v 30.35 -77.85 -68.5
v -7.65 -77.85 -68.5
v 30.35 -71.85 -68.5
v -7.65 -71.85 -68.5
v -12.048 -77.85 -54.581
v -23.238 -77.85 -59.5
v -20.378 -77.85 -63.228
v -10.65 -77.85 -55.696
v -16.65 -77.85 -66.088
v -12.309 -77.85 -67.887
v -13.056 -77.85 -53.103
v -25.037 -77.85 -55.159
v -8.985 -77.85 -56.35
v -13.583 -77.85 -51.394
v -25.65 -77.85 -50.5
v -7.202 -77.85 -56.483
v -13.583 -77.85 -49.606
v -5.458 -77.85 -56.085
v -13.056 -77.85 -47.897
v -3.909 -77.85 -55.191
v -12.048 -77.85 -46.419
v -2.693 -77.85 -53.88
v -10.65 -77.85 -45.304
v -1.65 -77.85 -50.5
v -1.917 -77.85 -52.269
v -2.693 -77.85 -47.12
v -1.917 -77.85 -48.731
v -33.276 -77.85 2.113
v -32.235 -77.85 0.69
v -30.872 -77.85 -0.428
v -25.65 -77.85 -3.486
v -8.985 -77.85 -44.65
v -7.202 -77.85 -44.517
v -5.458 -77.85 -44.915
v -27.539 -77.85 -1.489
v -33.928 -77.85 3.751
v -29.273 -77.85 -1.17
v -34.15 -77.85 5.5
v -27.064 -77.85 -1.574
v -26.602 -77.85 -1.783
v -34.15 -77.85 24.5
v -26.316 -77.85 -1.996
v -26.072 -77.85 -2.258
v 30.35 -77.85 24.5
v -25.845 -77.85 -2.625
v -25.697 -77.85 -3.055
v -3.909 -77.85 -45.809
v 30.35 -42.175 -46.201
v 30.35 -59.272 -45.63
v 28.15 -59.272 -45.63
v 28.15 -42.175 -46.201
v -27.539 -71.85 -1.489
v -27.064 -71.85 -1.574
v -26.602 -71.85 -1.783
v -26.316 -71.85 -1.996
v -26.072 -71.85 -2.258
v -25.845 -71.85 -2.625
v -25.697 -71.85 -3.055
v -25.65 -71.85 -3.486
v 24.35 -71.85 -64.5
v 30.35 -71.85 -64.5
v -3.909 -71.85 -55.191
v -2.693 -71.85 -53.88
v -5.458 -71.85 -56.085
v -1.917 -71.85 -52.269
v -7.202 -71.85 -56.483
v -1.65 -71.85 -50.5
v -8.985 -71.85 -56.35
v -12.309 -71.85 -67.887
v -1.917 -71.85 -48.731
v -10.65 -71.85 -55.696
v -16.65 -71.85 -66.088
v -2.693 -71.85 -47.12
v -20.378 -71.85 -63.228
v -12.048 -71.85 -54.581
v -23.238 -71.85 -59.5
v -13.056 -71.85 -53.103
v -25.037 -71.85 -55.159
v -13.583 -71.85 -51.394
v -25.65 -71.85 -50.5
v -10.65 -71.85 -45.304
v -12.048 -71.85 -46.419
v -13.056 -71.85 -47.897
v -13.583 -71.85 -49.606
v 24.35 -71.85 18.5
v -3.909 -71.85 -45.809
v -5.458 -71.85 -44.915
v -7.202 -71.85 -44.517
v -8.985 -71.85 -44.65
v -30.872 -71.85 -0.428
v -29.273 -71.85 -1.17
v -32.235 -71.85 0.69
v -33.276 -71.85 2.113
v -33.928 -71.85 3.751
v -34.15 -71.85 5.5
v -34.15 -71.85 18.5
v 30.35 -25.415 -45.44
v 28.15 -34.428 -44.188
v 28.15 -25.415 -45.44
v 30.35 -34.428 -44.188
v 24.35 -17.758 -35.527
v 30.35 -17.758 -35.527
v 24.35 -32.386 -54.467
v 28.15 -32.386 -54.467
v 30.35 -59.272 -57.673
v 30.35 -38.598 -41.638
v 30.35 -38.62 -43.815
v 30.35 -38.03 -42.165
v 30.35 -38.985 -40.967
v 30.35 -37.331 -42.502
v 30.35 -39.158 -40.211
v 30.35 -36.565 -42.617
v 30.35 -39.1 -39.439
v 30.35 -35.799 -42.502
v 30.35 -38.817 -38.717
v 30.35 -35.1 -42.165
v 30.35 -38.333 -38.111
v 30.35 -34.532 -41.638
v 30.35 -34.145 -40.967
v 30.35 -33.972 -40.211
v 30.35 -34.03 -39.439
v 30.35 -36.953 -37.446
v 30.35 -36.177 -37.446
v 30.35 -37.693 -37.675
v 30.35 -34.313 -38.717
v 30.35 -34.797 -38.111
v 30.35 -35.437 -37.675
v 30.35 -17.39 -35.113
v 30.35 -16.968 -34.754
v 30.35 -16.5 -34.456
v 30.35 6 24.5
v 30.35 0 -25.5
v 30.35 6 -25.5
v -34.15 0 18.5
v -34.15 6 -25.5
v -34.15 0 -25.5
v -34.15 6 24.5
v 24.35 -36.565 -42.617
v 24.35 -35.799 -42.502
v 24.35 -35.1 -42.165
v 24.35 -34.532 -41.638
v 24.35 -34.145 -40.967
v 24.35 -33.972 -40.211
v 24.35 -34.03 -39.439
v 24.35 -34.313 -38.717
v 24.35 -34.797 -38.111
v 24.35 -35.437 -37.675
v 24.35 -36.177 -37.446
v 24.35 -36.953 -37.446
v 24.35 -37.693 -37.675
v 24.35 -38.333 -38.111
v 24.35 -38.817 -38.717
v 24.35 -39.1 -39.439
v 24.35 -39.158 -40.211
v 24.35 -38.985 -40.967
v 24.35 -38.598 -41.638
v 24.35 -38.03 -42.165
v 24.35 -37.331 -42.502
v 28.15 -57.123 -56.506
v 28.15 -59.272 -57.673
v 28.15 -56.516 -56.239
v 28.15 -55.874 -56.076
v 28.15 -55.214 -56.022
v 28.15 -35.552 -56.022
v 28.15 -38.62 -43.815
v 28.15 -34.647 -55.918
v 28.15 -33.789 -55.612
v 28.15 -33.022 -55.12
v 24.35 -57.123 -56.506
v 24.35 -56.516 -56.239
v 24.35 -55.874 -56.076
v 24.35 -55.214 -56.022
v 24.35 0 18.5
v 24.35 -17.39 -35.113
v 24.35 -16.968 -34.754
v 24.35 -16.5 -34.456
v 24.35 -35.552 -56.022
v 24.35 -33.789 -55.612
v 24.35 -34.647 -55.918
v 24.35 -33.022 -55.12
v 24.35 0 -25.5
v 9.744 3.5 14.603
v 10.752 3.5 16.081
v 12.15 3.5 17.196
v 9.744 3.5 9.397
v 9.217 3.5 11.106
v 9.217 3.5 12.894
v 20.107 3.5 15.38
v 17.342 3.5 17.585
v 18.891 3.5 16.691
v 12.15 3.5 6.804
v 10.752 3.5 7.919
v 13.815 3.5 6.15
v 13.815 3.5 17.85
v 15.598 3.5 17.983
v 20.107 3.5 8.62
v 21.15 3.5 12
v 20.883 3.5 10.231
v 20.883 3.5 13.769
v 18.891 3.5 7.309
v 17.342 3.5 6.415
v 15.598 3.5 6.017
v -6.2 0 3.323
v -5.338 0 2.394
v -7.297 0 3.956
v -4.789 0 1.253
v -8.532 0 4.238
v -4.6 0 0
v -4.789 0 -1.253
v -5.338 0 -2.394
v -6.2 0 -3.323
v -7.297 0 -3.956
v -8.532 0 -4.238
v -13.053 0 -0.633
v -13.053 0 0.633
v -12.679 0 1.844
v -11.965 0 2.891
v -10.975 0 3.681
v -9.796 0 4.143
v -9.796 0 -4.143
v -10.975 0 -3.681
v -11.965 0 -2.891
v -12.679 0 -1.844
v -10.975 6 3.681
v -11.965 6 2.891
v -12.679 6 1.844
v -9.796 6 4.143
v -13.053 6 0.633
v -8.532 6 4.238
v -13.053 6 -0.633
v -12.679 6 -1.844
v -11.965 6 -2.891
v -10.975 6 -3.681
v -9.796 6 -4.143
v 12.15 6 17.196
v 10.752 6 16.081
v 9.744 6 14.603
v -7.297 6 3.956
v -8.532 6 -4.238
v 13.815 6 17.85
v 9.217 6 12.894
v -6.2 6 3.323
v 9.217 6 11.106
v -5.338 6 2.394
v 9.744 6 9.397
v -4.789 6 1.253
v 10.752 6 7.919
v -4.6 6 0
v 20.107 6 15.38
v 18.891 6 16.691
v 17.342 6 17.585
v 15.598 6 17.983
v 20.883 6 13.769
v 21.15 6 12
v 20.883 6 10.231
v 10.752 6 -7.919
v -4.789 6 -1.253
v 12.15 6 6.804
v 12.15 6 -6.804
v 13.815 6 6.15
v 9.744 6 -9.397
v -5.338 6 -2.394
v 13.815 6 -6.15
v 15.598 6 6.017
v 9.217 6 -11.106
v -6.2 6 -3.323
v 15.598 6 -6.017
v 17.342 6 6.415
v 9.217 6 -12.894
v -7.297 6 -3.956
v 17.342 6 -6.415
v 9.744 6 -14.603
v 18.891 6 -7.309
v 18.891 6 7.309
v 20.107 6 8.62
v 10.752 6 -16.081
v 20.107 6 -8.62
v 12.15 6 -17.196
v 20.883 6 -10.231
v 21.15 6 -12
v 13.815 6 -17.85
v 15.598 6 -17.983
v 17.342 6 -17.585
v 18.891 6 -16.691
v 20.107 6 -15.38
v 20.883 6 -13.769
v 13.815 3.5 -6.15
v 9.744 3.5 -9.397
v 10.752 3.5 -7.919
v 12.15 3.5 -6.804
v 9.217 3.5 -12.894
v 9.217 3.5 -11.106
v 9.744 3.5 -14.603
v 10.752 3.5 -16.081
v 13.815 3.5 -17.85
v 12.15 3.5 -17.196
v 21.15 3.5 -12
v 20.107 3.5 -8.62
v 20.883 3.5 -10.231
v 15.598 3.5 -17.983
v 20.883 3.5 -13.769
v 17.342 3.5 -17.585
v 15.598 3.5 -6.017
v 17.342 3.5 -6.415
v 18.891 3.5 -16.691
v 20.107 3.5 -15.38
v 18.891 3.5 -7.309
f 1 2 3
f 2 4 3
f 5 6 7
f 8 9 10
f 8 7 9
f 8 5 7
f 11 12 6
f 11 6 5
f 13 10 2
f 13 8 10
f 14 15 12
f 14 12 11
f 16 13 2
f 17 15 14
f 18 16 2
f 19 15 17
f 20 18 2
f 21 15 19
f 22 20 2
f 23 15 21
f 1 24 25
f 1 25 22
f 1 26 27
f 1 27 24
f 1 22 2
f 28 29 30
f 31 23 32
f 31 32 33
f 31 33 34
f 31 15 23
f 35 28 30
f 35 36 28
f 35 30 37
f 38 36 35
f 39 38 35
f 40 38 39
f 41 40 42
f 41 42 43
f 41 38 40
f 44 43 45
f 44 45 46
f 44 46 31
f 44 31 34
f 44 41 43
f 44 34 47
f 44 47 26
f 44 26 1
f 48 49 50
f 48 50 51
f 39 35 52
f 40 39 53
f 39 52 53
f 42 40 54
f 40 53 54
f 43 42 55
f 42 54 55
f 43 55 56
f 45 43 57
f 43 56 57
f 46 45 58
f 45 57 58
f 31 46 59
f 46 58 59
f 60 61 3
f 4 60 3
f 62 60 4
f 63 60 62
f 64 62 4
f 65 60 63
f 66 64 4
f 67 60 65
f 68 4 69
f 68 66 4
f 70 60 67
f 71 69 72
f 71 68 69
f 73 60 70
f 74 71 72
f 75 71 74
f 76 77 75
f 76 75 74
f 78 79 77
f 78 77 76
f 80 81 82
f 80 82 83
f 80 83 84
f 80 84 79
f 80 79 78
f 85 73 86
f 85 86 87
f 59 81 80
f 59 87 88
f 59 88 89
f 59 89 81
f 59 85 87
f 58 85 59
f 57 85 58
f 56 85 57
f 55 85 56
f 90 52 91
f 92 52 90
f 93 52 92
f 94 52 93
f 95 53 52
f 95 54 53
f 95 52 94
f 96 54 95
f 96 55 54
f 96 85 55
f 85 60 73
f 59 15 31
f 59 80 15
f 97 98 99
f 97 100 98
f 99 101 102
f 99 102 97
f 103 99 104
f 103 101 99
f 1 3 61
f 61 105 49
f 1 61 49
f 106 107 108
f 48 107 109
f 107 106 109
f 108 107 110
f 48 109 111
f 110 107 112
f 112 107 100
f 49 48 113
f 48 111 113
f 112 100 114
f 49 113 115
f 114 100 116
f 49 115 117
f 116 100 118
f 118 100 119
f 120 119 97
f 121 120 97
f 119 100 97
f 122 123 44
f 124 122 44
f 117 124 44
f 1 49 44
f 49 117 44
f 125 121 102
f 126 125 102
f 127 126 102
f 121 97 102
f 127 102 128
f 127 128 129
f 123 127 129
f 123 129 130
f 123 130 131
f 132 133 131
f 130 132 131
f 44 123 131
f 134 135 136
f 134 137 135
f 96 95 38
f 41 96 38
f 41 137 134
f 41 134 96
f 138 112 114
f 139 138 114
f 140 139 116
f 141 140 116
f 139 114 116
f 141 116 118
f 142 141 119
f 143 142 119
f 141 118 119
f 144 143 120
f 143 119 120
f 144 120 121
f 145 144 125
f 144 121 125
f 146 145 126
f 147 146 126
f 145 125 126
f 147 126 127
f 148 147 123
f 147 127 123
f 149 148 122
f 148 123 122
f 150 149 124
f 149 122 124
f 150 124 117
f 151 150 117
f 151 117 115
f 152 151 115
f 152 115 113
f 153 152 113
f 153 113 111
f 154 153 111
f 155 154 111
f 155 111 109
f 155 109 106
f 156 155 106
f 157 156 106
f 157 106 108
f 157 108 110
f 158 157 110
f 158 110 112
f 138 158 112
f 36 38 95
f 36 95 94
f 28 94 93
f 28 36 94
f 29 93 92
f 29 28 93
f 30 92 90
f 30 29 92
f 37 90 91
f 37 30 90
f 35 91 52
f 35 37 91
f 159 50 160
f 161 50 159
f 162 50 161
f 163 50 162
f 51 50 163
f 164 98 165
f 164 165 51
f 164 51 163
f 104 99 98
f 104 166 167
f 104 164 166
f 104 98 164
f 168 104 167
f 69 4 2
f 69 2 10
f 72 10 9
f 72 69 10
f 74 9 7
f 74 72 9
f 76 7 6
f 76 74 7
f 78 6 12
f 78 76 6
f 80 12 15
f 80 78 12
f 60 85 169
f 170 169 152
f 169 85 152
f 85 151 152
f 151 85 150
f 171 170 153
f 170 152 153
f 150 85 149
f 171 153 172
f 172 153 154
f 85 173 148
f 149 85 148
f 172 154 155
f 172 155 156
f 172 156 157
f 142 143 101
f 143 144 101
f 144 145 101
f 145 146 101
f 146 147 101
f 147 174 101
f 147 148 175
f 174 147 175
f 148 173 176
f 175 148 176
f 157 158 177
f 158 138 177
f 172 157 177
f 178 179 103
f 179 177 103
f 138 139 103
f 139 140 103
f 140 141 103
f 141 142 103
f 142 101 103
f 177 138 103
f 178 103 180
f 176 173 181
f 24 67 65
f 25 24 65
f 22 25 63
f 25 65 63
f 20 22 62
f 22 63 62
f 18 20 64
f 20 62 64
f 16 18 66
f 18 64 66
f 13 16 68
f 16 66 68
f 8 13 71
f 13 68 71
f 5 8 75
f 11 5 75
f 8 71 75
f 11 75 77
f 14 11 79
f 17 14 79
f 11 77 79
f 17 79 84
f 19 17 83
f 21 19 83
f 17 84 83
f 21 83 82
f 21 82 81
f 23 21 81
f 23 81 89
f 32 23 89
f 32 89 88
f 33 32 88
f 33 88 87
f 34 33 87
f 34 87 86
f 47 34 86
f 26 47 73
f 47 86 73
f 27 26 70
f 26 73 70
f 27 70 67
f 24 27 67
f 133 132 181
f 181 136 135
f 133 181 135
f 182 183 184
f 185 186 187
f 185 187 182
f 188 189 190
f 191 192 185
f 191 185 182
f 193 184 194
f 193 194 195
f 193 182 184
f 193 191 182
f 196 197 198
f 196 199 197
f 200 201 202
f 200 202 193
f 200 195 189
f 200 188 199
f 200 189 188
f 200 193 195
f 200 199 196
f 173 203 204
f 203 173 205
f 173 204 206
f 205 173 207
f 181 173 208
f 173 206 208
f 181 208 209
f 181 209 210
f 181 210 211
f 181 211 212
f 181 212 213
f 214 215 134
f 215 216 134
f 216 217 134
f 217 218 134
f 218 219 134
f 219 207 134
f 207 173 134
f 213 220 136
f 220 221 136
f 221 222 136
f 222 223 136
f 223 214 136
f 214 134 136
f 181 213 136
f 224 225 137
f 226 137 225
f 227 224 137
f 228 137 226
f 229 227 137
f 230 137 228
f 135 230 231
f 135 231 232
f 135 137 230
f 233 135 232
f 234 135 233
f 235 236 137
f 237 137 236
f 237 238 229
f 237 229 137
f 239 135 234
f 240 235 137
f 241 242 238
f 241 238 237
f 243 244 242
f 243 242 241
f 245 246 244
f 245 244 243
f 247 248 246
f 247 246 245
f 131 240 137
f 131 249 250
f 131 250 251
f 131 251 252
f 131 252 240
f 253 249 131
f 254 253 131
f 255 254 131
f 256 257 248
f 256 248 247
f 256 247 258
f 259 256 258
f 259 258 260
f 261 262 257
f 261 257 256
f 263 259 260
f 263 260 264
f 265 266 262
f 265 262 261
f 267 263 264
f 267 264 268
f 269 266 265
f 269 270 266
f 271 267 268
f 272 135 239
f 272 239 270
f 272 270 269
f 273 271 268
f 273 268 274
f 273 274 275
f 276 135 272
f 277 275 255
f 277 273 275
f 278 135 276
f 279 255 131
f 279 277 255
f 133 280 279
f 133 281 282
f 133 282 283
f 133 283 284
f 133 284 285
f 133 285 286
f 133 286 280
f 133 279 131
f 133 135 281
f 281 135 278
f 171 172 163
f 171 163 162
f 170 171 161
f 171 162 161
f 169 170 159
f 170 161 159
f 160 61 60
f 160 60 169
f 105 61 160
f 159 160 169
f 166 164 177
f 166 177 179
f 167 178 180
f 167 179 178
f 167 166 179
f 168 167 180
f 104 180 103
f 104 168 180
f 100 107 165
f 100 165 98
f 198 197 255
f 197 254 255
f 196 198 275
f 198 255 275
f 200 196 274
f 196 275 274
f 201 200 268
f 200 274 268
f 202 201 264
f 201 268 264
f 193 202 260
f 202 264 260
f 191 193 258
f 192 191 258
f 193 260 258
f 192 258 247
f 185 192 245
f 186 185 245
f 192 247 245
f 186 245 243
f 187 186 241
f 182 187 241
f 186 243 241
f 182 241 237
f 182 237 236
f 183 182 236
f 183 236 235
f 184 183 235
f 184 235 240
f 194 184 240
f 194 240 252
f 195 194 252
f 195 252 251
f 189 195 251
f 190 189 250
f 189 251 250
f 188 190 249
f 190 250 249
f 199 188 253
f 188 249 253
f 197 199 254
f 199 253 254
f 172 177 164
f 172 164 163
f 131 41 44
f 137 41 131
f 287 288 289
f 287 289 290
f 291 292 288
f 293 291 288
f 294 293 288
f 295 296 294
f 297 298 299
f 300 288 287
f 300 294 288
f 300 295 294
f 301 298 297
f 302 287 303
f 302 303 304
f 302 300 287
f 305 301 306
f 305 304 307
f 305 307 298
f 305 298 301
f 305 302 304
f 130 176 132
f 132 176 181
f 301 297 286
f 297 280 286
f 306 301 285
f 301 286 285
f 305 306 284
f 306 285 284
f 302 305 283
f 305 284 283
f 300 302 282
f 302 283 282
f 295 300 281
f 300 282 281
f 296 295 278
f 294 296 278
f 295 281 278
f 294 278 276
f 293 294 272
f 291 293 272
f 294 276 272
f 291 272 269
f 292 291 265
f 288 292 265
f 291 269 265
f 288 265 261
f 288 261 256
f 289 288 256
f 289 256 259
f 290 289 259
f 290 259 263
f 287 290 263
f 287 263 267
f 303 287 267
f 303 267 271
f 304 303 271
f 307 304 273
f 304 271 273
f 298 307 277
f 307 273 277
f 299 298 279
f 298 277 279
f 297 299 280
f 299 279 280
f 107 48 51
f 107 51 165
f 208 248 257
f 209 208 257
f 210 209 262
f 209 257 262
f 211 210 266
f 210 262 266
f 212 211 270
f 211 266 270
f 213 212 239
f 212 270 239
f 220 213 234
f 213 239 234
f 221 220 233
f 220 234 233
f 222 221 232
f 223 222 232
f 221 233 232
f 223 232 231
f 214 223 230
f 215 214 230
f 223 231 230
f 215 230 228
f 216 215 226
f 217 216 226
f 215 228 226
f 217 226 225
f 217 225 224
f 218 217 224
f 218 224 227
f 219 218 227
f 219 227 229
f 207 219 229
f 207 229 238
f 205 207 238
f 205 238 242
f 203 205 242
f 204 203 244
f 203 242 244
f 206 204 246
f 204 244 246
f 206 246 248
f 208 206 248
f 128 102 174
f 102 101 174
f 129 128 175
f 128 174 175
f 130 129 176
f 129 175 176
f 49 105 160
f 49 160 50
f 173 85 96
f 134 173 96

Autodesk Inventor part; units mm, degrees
ref_plane "YZ Plane" through (0, 0, 0) normal (1, 0, 0) x (0, 1, 0)
ref_plane "XZ Plane" through (0, 0, 0) normal (0, 1, 0) x (-1, 0, 0)
ref_plane "XY Plane" through (0, 0, 0) normal (0, 0, 1) x (1, 0, 0)
sketch "Sketch1" plane through (0, 0, 0) normal (0, 1, 0) x (-1, 0, 0)
  line L0 (0, -25.5) -> (-34.15, -25.5)
  line L1 (-34.15, -25.5) -> (-34.15, 0)
  line L2 (-34.15, 0) -> (-34.15, 25.5)
  line L3 (-34.15, 25.5) -> (0, 25.5)
  line L4 (0, 25.5) -> (34.15, 25.5)
  line L5 (34.15, 25.5) -> (34.15, 0)
  line L6 (34.15, 0) -> (34.15, -25.5)
  line L7 (34.15, -25.5) -> (0, -25.5)
  point P0 (0, 0)
extrude "Extrusion1" add sketch "Sketch1" along normal blind 7
sketch "Sketch3" plane through (-34.15, 0, 25.5) normal (0, 0, 1) x (1, 0, 0)
  line L0 (0, 0) -> (0, -78.85)
  point P0 (34.15, 0)
  dimension "d7" = 78.85
sketch "Sketch4" plane through (-34.15, 0, -25.5) normal (-1, 0, 0) x (0, 0, 1)
  line L0 (51, 0) -> (51, -78.85)
  line L1 (51, -78.85) -> (-39, -78.85)
  line L2 (-39, -78.85) -> (-39, -71.85)
  line L3 (0, 0) -> (-39, -71.85)
  line L4 (0, 0) -> (51, 0)
  point P0 (25.5, 0)
  dimension "d10" = 90
  dimension "d11" = 7
extrude "Extrusion2" add sketch "Sketch4" against normal blind 7
sketch "Sketch7" plane through (-27.15, 0, -25.5) normal (1, 0, 0) x (0, 0, -1)
  line L0 (-51, -78.85) -> (39, -78.85) projected
  line L1 (-51, -78.85) -> (39, -78.85)
  line L2 (39, -78.85) -> (39, -71.85) projected
  line L3 (39, -78.85) -> (39, -71.85)
  line L4 (39, -71.85) -> (-51, -71.85)
  line L5 (-51, 0) -> (-51, -78.85) projected
  line L6 (-51, -78.85) -> (-51, -71.85)
  point P0 (-25.5, 0)
sketch "Sketch8" plane through (0, 0, 0) normal (0, -1, 0) x (1, 0, 0)
  circle A0 centre (8.15, 0) radius 5 projected
  line L0 (8.15, 18.5) -> (34.15, 18.5)
  line L1 (34.15, 25.5) -> (34.15, -25.5) projected
  line L2 (8.15, 25.5) -> (34.15, 25.5)
  line L3 (8.15, 25.5) -> (-27.15, 25.5)
  line L4 (-27.15, 25.5) -> (-27.15, -25.5) projected
  line L5 (8.15, 18.5) -> (-27.15, 18.5)
  line L6 (34.15, 25.5) -> (34.15, 18.5)
  line L7 (-27.15, 25.5) -> (-27.15, 18.5)
  point P0 (0, 0)
extrude "Extrusion6" add sketch "Sketch7" along normal blind 58.5
extrude "Extrusion7" add sketch "Sketch8" along normal blind 78.75 contours L5 L4 L3 L2 L1 L0
sketch "Sketch9" plane through (31.35, 0, -25.5) normal (1, 0, 0) x (0, 0, -1)
  line L0 (-51, -78.75) -> (-51, 7) projected
  line L1 (-44, 0) -> (-44, -71.85) projected
  line L2 (-51, -78.75) -> (-44, -78.75)
  line L3 (-44, -78.75) -> (-44, -71.85)
  line L4 (-44, -71.85) -> (-51, -71.85)
  line L5 (-51, -71.85) -> (-51, -78.75)
  point P0 (-25.5, 0)
extrude "Extrusion8" cut sketch "Sketch9" along normal blind 10
sketch "Sketch10" plane through (0, 7, 0) normal (0, 1, 0) x (1, 0, 0)
  point P0 (0, 0)
sketch "Boceto11" plane through (-34.15, -78.85, -64.5) normal (0, -1, 0) x (1, 0, 0)
  line L0 (0, 0) -> (65.5, 0) projected
  line L1 (65.5, 89.9985) -> (65.5, 0)
  line L2 (65.5, 0) -> (71.065, 0)
  line L3 (71.065, 0) -> (71.065, 89.9985)
  line L4 (71.065, 89.9985) -> (65.5, 89.9985)
  line L5 (65.5, 89.9985) -> (65.5, 95.8996)
  line L6 (65.5, 95.8996) -> (71.065, 89.9985)
  point P0 (34.15, 64.5)
extrude "Extrusión9" cut sketch "Boceto11" against normal blind 100
sketch "Boceto12" plane through (31.35, 0, -25.5) normal (1, 0, 0) x (0, 0, -1)
  line L0 (-44, 0) -> (-44, -71.85) projected
  line L1 (-44, 0) -> (-44, -71.85)
  line L2 (39, -71.85) -> (39, -78.85) projected
  line L3 (-44, -71.85) -> (39, -71.85)
  line L4 (-44, 0) -> (0, 0) projected
  line L5 (39, -71.85) -> (0, 0)
  line L6 (0, 0) -> (-44, 0)
  point P0 (-25.5, 0)
extrude "Extrusión10" add sketch "Boceto12" against normal blind 7
sketch "Boceto13" plane through (-34.15, 7, -25.5) normal (-1, 0, 0) x (0, 0, 1)
  line L0 (0, -7) -> (0, 0) projected
  line L1 (44, -7) -> (0, -7) projected
  line L2 (0, -7) -> (44, -7)
  line L3 (44, -78.85) -> (-39, -78.85) projected
  line L4 (44, -7) -> (44, -78.85)
  line L5 (44, -78.85) -> (-39, -78.85)
  line L6 (-39, -78.85) -> (0, -7)
  point P0 (25.5, -7)
extrude "Extrusión11" cut sketch "Boceto13" against normal blind 7
sketch "Boceto15" plane through (-34.15, 0, -25.5) normal (0, 0, -1) x (-1, 0, 0)
  point P0 (-34.15, 0)
sketch "Boceto19" plane through (-34.15, -78.85, -64.5) normal (0, -1, 0) x (1, 0, 0)
  line L0 (65.5, 90) -> (65.5, 0) projected
  line L1 (65.5, 0) -> (65.5, 40.9323)
  line L2 (81.7334, 40.9323) -> (65.5, 40.9323)
  line L3 (81.7334, 40.9323) -> (81.7334, 0)
  line L4 (81.7334, 0) -> (65.5, 0)
  point P0 (34.15, 64.5)
extrude "Extrusión17" cut sketch "Boceto19" against normal blind 100
sketch "Boceto20" plane through (24.35, 0, -25.5) normal (-1, 0, 0) x (0, 0, 1)
  line L0 (-29.1839, -53.7657) -> (-27.9516, -53.3206) projected
  line L1 (0, 0) -> (-39, -71.85) projected
  line L2 (-29.1839, -53.7657) -> (-27.8697, -51.3447)
  line L3 (-27.8697, -51.3447) -> (-27.9516, -53.3206) projected
  line L4 (-27.8697, -51.3447) -> (-27.9516, -53.3206)
  line L5 (-27.9516, -53.3206) -> (-29.1839, -53.7657)
  point P0 (25.5, 0)
extrude "Extrusión18" add sketch "Boceto20" against normal blind 7
sketch "Boceto21" plane through (24.35, 0, -25.5) normal (-1, 0, 0) x (0, 0, 1)
  point P0 (25.5, 0)
sketch "Boceto22" plane through (24.35, 0, -25.5) normal (-1, 0, 0) x (0, 0, 1)
  point P0 (25.5, 0)
sketch "Boceto24" plane through (31.35, 0, -25.5) normal (1, 0, 0) x (0, 0, -1)
  point P0 (-25.5, 0)
sketch "Boceto26" plane through (24.35, 0, -25.5) normal (-1, 0, 0) x (0, 0, 1)
  point P0 (25.5, 0)
sketch "Boceto27" plane through (31.35, 0, -25.5) normal (1, 0, 0) x (0, 0, -1)
  line L0 (-51, 7) -> (0, 7) projected
  line L1 (0, 7) -> (16.0227, 7)
  line L2 (16.0227, 7) -> (16.0227, -29.5187)
  line L3 (0, 0) -> (39, -71.85) projected
  line L4 (16.0227, -29.5187) -> (0, 0)
  line L5 (0, 0) -> (0, 7)
  point P0 (-25.5, 0)
extrude "Extrusión22" add sketch "Boceto27" against normal blind 7
sketch "Boceto28" plane through (24.35, 0, -25.5) normal (-1, 0, 0) x (0, 0, 1)
  line L0 (-16.0227, -29.5187) -> (-39, -71.85) projected
  line L1 (-16.0227, -29.5187) -> (0, 0)
  line L2 (0, 7) -> (-16.0227, 7) projected
  line L3 (0, 0) -> (0, 7)
  line L4 (0, 7) -> (-16.0227, 7)
  line L5 (-16.0227, 7) -> (-16.0227, -29.5187) projected
  line L6 (-16.0227, 7) -> (-16.0227, -29.5187)
  point P0 (25.5, 0)
extrude "Extrusión23" cut sketch "Boceto28" against normal blind 7
sketch "Boceto29" plane through (31.35, 0, -25.5) normal (1, 0, 0) x (0, 0, -1)
  point P0 (-25.5, 0)
sketch "Boceto31" plane through (-34.15, -78.85, -64.5) normal (0, 0, -1) x (-1, 0, 0)
  line L0 (0, 7) -> (0, 0) projected
  line L1 (0, 0) -> (0, 1)
  line L2 (0, 1) -> (-65.5, 1)
  line L3 (-65.5, 0) -> (-65.5, 85.85) projected
  line L4 (-65.5, 1) -> (-64.5, 1)
  line L5 (-64.5, 1) -> (-64.5, 85.85)
  line L6 (0, 85.85) -> (-65.5, 85.85) projected
  line L7 (-64.5, 85.85) -> (0, 85.85)
  line L8 (0, 85.85) -> (0, 84.85)
  line L9 (0, 0) -> (0, 85.85) projected
  line L10 (0, 84.85) -> (-64.5, 84.85)
  line L11 (-64.5, 85.85) -> (-65.5, 85.85)
  line L12 (0, 0) -> (-65.5, 0) projected
  line L13 (-65.5, 85.85) -> (-65.5, 0)
  line L14 (-65.5, 0) -> (0, 0)
  point P0 (-34.15, 78.85)
  dimension "d84" = 1
  dimension "d85" = 1
  dimension "d86" = 1
extrude "Extrusión26" cut sketch "Boceto31" against normal blind 1000 contours L0 L12 L3 L2 | L10 L5 L6 L8 | L2 L3 L6 L5
sketch "Boceto32" plane through (-34.15, -71.85, 18.5) normal (-1, 0, 0) x (0, 0, 1)
  line L0 (-83, -6) -> (7, -6) projected
  line L1 (7, -6) -> (6, -6)
  line L2 (6, -6) -> (6, 77.85)
  line L3 (7, 77.85) -> (-44, 77.85) projected
  line L4 (7, -6) -> (7, 77.85) projected
  line L5 (6, 77.85) -> (7, 77.85)
  line L6 (7, 77.85) -> (7, -6)
  point P0 (-18.5, 71.85)
  dimension "d89" = 1
extrude "Extrusión27" cut sketch "Boceto32" against normal blind 100
sketch "Boceto33" plane through (-34.15, 6, -25.5) normal (0, 1, 0) x (1, 0, 0)
  line L0 (0, 0) -> (0, -44) projected
  line L1 (0, 0) -> (0, -25.5)
  line L2 (0, -25.5) -> (25.3, -25.5)
  circle A0 centre (25.3, -25.5) radius 4.25
  point P0 (34.15, -25.5)
  dimension "d92" = 25.5
  dimension "d93" = 25.3
  dimension "d94" = 8.5
extrude "Extrusión28" cut sketch "Boceto33" against normal blind 10
sketch "Boceto34" plane through (30.35, -77.85, -64.5) normal (1, 0, 0) x (0, 0, -1)
  point P0 (-64.5, 77.85)
sketch "Boceto35" plane through (30.35, -77.85, -64.5) normal (1, 0, 0) x (0, 0, -1)
  circle A0 centre (-24.4828, 41.285) radius 2.6
  point P0 (-64.5, 77.85)
  dimension "d101" = 5.2
extrude "Extrusión29" cut sketch "Boceto35" against normal blind 10
sketch "Boceto36" plane through (30.35, -77.85, -64.5) normal (1, 0, 0) x (0, 0, -1)
  point P0 (-64.5, 77.85)
sketch "Boceto37" plane through (30.35, -77.85, -64.5) normal (1, 0, 0) x (0, 0, -1)
  line L0 (-39, 77.85) -> (0, 6) projected
  line L1 (-12.3437, 28.741) -> (-12.3437, 48.1268)
  line L2 (-12.3437, 48.1268) -> (-28.4038, 58.3285)
  line L3 (-12.3437, 28.741) -> (-28.4038, 58.3285)
  point P0 (-64.5, 77.85)
extrude "Extrusión30" add sketch "Boceto37" against normal blind 6
fillet "Empalme3" radius 10 3 edges at (27.35, -29.7232, -52.1563) (27.35, -49.109, -52.1563) (27.35, -19.5215, -36.0962)
sketch "Boceto38" plane through (30.35, -77.85, -64.5) normal (1, 0, 0) x (0, 0, -1)
  point P0 (-64.5, 77.85)
sketch "Boceto39" plane through (30.35, -77.85, -64.5) normal (1, 0, 0) x (0, 0, -1)
  line L0 (-6.8274, 18.5782) -> (-18.8698, 18.5782)
  line L1 (-18.8698, 18.5782) -> (-18.2969, 35.7502)
  line L2 (-18.2969, 35.7502) -> (-20.685, 39.2299)
  line L3 (-20.685, 39.2299) -> (-19.4909, 52.6668)
  line L4 (-26.2143, 56.9377) -> (-16.9818, 51.073) projected
  line L5 (-6.8274, 18.5782) -> (-5.5662, 48.0514)
  line L6 (-5.5662, 48.0514) -> (-19.4909, 52.6668)
  point P0 (-64.5, 77.85)
extrude "Extrusión31" cut sketch "Boceto39" against normal blind 2.2
fillet "Empalme4" radius 10 1 edges at (29.25, -25.1832, -45.0091)
sketch "Boceto40" plane through (24.35, 0, -25.5) normal (-1, 0, 0) x (0, 0, 1)
  line L0 (-26.6563, -35.218) -> (-26.6563, -46.57) projected
  line L1 (-26.6563, -35.218) -> (-24.0221, -30.4862) construction
  arc A0 (-12.7857, -20.9123) -> (-9.3588, -17.2419) centre (-18.1476, -12.4713) ccw projected
  line L2 (-24.0221, -30.4862) -> (-10.7107, -19.1566) construction
  spline S0 degree 2 poles (-26.6563, -35.218) (-24.0221, -30.4862) (-10.7107, -19.1566) knots 1 1 1 2 2 2
  line L3 (-26.6563, -35.218) -> (-10.7107, -35.218)
  line L4 (-10.7107, -35.218) -> (-10.7107, -19.1566)
  line L5 (-10.7107, -19.1566) -> (-26.6563, -19.1566)
  line L6 (-26.6563, -19.1566) -> (-26.6563, -35.218)
  point P0 (25.5, 0)
  point P1 (-10.7107, -19.1566)
extrude "Extrusión32" cut sketch "Boceto40" against normal blind 6 contours S0 L6 L5
fillet "Empalme5" radius 10 1 edges at (26.25, -35.218, -52.1563)
sketch "Boceto41" plane through (-34.15, -71.85, 18.5) normal (0, 1, 0) x (1, 0, 0)
  circle A0 centre (11.5, 71.5) radius 5 projected
  circle A1 centre (11.5, 71.5) radius 6
  line L0 (11.5, 71.5) -> (-12.5, 71.5)
  line L1 (-12.5, 71.5) -> (-12.5, 95.5)
  line L2 (-12.5, 95.5) -> (11.5, 95.5)
  line L3 (11.5, 95.5) -> (11.5, 71.5)
  line L4 (64.5, 76.1726) -> (64.5, 83) projected
  line L5 (64.5, 83) -> (64.5, 95.5)
  line L6 (64.5, 95.5) -> (11.5, 95.5)
  line L7 (0, 83) -> (0, -6) projected
  line L8 (0, -6) -> (-12.5, -6)
  line L9 (-12.5, -6) -> (-12.5, 71.5)
  line L10 (64.5, 83) -> (11.5, 83)
  line L11 (0, 83) -> (58.5, 83) projected
  point P0 (34.15, 18.5)
  dimension "d113" = 12
  dimension "d114" = 24
  dimension "d115" = 24
extrude "Extrusión33" add sketch "Boceto41" against normal blind 6 contours L11 L7 L0 L1 L2 L3 | L3 L6 L5 L10 | L7 L8 L9 L0
sketch "Boceto43" plane through (30.35, 6, 24.5) normal (0, 1, 0) x (1, 0, 0)
  circle A0 centre (-39.2, 24.5) radius 4.25 projected
  line L0 (-39.2, 24.5) -> (-15.2, 24.5)
  line L1 (-15.2, 24.5) -> (-15.2, 12.5)
  line L2 (-15.2, 12.5) -> (-15.2, 36.5)
  circle A1 centre (-15.2, 36.5) radius 6
  circle A2 centre (-15.2, 12.5) radius 6
  point P0 (-30.35, 24.5)
  dimension "d123" = 24
  dimension "d124" = 12
  dimension "d125" = 24
  dimension "d126" = 12
  dimension "d127" = 12
extrude "Extrusión35" cut sketch "Boceto43" against normal blind 2.5 contours A1 | A2
sketch "Boceto44" plane through (24.35, 0, -25.5) normal (-1, 0, 0) x (0, 0, 1)
  line L0 (0, 0) -> (-9.3588, -17.2419) projected
  line L1 (-9.3588, -17.2419) -> (-30.5215, -33.5874)
  line L2 (-30.5215, -33.5874) -> (-30.5215, -56.2301)
  line L3 (-27.8675, -51.3405) -> (-39, -71.85) projected
  arc A0 (-12.666, -20.8351) -> (-9.3588, -17.2419) centre (-18.1476, -12.4713) ccw projected
  line L4 (-30.5215, -56.2301) -> (-9.3588, -17.2419)
  point P0 (25.5, 0)
extrude "Extrusión36" add sketch "Boceto44" against normal blind 6
sketch "Boceto45" plane through (30.35, 0, -25.5) normal (1, 0, 0) x (0, 0, -1)
  line L0 (18.315, -38.6201) -> (18.6875, -34.4282) projected
  line L1 (18.6875, -34.4282) -> (19.9402, -25.4146)
  line L2 (9.3588, -17.2419) -> (30.5215, -33.5874) projected
  line L3 (30.5215, -56.2301) -> (30.5215, -33.5874) projected
  line L4 (19.9402, -25.4146) -> (30.5215, -33.5874)
  line L5 (30.5215, -33.5874) -> (32.1519, -59.2336)
  line L6 (30.5215, -56.2301) -> (39, -71.85) projected
  line L7 (32.1726, -59.2718) -> (20.1302, -59.2718) projected
  line L8 (32.1726, -59.2718) -> (18.315, -38.6201)
  point P0 (-25.5, 0)
extrude "Extrusión37" cut sketch "Boceto45" against normal blind 2.2 contours L0 L1 L2 L3 L6 L8
fillet "Empalme7" radius 4 3 edges at (26.25, -33.5874, -56.0215) (27.35, -17.2419, -34.8588) (26.25, -56.2301, -56.0215)
sketch "Boceto46" plane through (-34.15, -71.85, 18.5) normal (0, 1, 0) x (1, 0, 0)
  line L0 (-12.5, -6) -> (0, -6) projected
  line L1 (0, -6) -> (0, 95.5)
  line L2 (-12.5, 95.5) -> (64.5, 95.5) projected
  line L3 (0, 95.5) -> (-12.5, 95.5)
  line L4 (-12.5, 95.5) -> (-12.5, -6)
  line L5 (-12.5, -6) -> (0, -6)
  point P0 (34.15, 18.5)
extrude "Extrusión38" cut sketch "Boceto46" against normal blind 10
sketch "Boceto47" plane through (-34.15, -71.85, 18.5) normal (0, 1, 0) x (1, 0, 0)
  line L0 (0, 0) -> (0, -6) projected
  line L1 (0, 95.5) -> (26.5, 95.5)
  line L2 (26.5, 95.5) -> (26.5, 69)
  line L3 (26.5, 69) -> (0, 69)
  line L4 (0, 69) -> (0, 95.5)
  circle A0 centre (26.5, 69) radius 6
  point P0 (34.15, 18.5)
  dimension "d137" = 26.5
  dimension "d138" = 26.5
  dimension "d139" = 12
extrude "Extrusión39" cut sketch "Boceto47" against normal blind 10 contours A0 L3 L2 | L2 L3 A0
sketch "Sketch48" plane through (-34.15, -71.85, 18.5) normal (0, 1, 0) x (1, 0, 0)
  circle A0 centre (26.5, 69) radius 6 projected
  line L0 (29.7126, 74.0675) -> (26.5, 69)
  circle A1 centre (26.5, 69) radius 18
  line L1 (8.5, 69) -> (8.5, 0)
  line L2 (0, 0) -> (58.5, 0) projected
  line L3 (0, 0) -> (8.5, 0)
  line L4 (26.5, 87) -> (64.5, 87)
  line L5 (64.5, 83) -> (64.5, 95.5) projected
  line L6 (0, 0) -> (0, 95.5) projected
  line L7 (64.5, 95.5) -> (0, 95.5)
  line L8 (0, 95.5) -> (0, 0)
  point P0 (34.15, 18.5)
  dimension "d142" = 36
extrude "Extrusion40" cut sketch "Sketch48" against normal blind 10 contours A1 L1 L2 L6 L7 L5 L4
sketch "Sketch49" plane through (24.35, 0, 18.5) normal (0, 0, -1) x (-1, 0, 0)
  line L0 (58.5, -77.85) -> (50, -77.85) projected
  line L1 (58.5, -77.85) -> (50, -77.85)
  line L2 (50, -71.85) -> (0, -71.85) projected
  line L3 (50, -77.85) -> (50, -71.85)
  line L4 (50, -71.85) -> (58.5, -71.85)
  line L5 (58.5, -71.85) -> (58.5, -77.85)
  point P0 (24.35, 0)
extrude "Extrusion41" add sketch "Sketch49" along normal blind 20
fillet "Fillet8" radius 7 1 edges at (-34.15, -74.85, -1.5)
fillet "Fillet9" radius 2 1 edges at (-25.65, -74.85, -1.5)
sketch "Sketch50" plane through (28.15, -77.85, -64.5) normal (1, 0, 0) x (0, 0, -1)
  point P0 (-64.5, 77.85)
sketch "Sketch51" plane through (-34.15, -77.85, 24.5) normal (0, -1, 0) x (1, 0, 0)
  line L0 (64.5, -50) -> (64.5, 0) projected
  line L1 (64.5, 0) -> (-39.5, 0)
  line L2 (-39.5, 0) -> (-39.5, -120)
  line L3 (-39.5, -120) -> (64.5, -120)
  line L4 (64.5, -120) -> (64.5, 0)
  point P0 (34.15, -24.5)
  dimension "d149" = 104
  dimension "d150" = 120
properties part number "AC23[i3][L]" material "Aluminio 6061"
